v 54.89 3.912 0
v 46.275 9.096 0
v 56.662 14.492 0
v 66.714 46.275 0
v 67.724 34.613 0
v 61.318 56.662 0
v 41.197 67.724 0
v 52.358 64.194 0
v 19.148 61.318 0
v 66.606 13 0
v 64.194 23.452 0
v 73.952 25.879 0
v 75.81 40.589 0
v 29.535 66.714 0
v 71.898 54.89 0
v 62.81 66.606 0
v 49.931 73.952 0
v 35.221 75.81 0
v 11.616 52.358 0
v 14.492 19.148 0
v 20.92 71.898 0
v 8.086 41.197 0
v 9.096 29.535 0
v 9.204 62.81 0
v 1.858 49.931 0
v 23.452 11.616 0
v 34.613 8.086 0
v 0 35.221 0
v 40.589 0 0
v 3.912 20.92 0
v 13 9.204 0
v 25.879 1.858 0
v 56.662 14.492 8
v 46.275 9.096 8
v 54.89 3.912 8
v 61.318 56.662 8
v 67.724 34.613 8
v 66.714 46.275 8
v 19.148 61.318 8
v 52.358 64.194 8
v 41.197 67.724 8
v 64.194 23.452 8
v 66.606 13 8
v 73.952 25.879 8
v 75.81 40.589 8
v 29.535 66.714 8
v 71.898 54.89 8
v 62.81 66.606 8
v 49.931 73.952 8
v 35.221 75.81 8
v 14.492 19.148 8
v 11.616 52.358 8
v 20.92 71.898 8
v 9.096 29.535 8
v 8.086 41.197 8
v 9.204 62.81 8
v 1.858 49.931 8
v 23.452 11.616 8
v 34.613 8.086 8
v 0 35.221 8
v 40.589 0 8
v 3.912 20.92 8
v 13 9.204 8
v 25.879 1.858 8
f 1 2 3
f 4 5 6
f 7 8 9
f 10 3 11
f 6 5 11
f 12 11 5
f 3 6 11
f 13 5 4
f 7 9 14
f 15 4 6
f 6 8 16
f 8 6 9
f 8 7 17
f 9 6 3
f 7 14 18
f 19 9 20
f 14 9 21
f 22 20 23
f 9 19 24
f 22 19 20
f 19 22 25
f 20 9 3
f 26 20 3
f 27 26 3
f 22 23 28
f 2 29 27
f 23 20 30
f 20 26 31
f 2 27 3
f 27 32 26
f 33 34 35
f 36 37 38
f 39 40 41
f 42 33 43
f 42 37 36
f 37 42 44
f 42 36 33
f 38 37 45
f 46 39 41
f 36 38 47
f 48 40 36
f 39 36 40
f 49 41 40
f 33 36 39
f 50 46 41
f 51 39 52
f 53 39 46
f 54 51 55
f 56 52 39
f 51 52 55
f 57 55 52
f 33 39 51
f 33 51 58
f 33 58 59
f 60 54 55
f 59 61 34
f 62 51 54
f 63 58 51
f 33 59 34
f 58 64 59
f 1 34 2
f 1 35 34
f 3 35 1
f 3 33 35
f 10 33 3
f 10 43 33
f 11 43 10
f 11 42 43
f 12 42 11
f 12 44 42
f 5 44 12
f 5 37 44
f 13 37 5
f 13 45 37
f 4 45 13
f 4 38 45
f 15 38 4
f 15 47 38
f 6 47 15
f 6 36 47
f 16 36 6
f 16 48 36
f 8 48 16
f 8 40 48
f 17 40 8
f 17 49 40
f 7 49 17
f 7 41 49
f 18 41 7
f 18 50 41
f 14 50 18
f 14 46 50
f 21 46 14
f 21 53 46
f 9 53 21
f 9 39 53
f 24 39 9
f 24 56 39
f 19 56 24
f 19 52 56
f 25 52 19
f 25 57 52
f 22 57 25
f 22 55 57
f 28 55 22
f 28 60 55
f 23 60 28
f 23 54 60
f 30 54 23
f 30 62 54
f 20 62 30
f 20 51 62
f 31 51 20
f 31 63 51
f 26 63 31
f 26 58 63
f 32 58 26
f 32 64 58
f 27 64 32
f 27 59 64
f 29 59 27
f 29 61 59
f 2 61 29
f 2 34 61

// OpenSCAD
$fn = 32;

// ----------------------------------------------------------------------
// Chain sprocket: 16 teeth, 30 mm root radius
// ----------------------------------------------------------------------

// --- parameters (mm) ---
profile_height = 8;       // extrusion height
profile_points = 32;      // points of the closed outline

profile = [[67.724, 34.613], [75.81, 40.589], [66.714, 46.275], [71.898, 54.89], [61.318, 56.662], [62.81, 66.606], [52.358, 64.194], [49.931, 73.952], [41.197, 67.724], [35.221, 75.81], [29.535, 66.714], [20.92, 71.898], [19.148, 61.318], [9.204, 62.81], [11.616, 52.358], [1.858, 49.931], [8.086, 41.197], [0, 35.221], [9.096, 29.535], [3.912, 20.92], [14.492, 19.148], [13, 9.204], [23.452, 11.616], [25.879, 1.858], [34.613, 8.086], [40.589, 0], [46.275, 9.096], [54.89, 3.912], [56.662, 14.492], [66.606, 13], [64.194, 23.452], [73.952, 25.879]];  // single closed polygon, 32 points, counter clockwise

// --- the one profile operation ---
linear_extrude(height = profile_height) polygon(points = profile);
